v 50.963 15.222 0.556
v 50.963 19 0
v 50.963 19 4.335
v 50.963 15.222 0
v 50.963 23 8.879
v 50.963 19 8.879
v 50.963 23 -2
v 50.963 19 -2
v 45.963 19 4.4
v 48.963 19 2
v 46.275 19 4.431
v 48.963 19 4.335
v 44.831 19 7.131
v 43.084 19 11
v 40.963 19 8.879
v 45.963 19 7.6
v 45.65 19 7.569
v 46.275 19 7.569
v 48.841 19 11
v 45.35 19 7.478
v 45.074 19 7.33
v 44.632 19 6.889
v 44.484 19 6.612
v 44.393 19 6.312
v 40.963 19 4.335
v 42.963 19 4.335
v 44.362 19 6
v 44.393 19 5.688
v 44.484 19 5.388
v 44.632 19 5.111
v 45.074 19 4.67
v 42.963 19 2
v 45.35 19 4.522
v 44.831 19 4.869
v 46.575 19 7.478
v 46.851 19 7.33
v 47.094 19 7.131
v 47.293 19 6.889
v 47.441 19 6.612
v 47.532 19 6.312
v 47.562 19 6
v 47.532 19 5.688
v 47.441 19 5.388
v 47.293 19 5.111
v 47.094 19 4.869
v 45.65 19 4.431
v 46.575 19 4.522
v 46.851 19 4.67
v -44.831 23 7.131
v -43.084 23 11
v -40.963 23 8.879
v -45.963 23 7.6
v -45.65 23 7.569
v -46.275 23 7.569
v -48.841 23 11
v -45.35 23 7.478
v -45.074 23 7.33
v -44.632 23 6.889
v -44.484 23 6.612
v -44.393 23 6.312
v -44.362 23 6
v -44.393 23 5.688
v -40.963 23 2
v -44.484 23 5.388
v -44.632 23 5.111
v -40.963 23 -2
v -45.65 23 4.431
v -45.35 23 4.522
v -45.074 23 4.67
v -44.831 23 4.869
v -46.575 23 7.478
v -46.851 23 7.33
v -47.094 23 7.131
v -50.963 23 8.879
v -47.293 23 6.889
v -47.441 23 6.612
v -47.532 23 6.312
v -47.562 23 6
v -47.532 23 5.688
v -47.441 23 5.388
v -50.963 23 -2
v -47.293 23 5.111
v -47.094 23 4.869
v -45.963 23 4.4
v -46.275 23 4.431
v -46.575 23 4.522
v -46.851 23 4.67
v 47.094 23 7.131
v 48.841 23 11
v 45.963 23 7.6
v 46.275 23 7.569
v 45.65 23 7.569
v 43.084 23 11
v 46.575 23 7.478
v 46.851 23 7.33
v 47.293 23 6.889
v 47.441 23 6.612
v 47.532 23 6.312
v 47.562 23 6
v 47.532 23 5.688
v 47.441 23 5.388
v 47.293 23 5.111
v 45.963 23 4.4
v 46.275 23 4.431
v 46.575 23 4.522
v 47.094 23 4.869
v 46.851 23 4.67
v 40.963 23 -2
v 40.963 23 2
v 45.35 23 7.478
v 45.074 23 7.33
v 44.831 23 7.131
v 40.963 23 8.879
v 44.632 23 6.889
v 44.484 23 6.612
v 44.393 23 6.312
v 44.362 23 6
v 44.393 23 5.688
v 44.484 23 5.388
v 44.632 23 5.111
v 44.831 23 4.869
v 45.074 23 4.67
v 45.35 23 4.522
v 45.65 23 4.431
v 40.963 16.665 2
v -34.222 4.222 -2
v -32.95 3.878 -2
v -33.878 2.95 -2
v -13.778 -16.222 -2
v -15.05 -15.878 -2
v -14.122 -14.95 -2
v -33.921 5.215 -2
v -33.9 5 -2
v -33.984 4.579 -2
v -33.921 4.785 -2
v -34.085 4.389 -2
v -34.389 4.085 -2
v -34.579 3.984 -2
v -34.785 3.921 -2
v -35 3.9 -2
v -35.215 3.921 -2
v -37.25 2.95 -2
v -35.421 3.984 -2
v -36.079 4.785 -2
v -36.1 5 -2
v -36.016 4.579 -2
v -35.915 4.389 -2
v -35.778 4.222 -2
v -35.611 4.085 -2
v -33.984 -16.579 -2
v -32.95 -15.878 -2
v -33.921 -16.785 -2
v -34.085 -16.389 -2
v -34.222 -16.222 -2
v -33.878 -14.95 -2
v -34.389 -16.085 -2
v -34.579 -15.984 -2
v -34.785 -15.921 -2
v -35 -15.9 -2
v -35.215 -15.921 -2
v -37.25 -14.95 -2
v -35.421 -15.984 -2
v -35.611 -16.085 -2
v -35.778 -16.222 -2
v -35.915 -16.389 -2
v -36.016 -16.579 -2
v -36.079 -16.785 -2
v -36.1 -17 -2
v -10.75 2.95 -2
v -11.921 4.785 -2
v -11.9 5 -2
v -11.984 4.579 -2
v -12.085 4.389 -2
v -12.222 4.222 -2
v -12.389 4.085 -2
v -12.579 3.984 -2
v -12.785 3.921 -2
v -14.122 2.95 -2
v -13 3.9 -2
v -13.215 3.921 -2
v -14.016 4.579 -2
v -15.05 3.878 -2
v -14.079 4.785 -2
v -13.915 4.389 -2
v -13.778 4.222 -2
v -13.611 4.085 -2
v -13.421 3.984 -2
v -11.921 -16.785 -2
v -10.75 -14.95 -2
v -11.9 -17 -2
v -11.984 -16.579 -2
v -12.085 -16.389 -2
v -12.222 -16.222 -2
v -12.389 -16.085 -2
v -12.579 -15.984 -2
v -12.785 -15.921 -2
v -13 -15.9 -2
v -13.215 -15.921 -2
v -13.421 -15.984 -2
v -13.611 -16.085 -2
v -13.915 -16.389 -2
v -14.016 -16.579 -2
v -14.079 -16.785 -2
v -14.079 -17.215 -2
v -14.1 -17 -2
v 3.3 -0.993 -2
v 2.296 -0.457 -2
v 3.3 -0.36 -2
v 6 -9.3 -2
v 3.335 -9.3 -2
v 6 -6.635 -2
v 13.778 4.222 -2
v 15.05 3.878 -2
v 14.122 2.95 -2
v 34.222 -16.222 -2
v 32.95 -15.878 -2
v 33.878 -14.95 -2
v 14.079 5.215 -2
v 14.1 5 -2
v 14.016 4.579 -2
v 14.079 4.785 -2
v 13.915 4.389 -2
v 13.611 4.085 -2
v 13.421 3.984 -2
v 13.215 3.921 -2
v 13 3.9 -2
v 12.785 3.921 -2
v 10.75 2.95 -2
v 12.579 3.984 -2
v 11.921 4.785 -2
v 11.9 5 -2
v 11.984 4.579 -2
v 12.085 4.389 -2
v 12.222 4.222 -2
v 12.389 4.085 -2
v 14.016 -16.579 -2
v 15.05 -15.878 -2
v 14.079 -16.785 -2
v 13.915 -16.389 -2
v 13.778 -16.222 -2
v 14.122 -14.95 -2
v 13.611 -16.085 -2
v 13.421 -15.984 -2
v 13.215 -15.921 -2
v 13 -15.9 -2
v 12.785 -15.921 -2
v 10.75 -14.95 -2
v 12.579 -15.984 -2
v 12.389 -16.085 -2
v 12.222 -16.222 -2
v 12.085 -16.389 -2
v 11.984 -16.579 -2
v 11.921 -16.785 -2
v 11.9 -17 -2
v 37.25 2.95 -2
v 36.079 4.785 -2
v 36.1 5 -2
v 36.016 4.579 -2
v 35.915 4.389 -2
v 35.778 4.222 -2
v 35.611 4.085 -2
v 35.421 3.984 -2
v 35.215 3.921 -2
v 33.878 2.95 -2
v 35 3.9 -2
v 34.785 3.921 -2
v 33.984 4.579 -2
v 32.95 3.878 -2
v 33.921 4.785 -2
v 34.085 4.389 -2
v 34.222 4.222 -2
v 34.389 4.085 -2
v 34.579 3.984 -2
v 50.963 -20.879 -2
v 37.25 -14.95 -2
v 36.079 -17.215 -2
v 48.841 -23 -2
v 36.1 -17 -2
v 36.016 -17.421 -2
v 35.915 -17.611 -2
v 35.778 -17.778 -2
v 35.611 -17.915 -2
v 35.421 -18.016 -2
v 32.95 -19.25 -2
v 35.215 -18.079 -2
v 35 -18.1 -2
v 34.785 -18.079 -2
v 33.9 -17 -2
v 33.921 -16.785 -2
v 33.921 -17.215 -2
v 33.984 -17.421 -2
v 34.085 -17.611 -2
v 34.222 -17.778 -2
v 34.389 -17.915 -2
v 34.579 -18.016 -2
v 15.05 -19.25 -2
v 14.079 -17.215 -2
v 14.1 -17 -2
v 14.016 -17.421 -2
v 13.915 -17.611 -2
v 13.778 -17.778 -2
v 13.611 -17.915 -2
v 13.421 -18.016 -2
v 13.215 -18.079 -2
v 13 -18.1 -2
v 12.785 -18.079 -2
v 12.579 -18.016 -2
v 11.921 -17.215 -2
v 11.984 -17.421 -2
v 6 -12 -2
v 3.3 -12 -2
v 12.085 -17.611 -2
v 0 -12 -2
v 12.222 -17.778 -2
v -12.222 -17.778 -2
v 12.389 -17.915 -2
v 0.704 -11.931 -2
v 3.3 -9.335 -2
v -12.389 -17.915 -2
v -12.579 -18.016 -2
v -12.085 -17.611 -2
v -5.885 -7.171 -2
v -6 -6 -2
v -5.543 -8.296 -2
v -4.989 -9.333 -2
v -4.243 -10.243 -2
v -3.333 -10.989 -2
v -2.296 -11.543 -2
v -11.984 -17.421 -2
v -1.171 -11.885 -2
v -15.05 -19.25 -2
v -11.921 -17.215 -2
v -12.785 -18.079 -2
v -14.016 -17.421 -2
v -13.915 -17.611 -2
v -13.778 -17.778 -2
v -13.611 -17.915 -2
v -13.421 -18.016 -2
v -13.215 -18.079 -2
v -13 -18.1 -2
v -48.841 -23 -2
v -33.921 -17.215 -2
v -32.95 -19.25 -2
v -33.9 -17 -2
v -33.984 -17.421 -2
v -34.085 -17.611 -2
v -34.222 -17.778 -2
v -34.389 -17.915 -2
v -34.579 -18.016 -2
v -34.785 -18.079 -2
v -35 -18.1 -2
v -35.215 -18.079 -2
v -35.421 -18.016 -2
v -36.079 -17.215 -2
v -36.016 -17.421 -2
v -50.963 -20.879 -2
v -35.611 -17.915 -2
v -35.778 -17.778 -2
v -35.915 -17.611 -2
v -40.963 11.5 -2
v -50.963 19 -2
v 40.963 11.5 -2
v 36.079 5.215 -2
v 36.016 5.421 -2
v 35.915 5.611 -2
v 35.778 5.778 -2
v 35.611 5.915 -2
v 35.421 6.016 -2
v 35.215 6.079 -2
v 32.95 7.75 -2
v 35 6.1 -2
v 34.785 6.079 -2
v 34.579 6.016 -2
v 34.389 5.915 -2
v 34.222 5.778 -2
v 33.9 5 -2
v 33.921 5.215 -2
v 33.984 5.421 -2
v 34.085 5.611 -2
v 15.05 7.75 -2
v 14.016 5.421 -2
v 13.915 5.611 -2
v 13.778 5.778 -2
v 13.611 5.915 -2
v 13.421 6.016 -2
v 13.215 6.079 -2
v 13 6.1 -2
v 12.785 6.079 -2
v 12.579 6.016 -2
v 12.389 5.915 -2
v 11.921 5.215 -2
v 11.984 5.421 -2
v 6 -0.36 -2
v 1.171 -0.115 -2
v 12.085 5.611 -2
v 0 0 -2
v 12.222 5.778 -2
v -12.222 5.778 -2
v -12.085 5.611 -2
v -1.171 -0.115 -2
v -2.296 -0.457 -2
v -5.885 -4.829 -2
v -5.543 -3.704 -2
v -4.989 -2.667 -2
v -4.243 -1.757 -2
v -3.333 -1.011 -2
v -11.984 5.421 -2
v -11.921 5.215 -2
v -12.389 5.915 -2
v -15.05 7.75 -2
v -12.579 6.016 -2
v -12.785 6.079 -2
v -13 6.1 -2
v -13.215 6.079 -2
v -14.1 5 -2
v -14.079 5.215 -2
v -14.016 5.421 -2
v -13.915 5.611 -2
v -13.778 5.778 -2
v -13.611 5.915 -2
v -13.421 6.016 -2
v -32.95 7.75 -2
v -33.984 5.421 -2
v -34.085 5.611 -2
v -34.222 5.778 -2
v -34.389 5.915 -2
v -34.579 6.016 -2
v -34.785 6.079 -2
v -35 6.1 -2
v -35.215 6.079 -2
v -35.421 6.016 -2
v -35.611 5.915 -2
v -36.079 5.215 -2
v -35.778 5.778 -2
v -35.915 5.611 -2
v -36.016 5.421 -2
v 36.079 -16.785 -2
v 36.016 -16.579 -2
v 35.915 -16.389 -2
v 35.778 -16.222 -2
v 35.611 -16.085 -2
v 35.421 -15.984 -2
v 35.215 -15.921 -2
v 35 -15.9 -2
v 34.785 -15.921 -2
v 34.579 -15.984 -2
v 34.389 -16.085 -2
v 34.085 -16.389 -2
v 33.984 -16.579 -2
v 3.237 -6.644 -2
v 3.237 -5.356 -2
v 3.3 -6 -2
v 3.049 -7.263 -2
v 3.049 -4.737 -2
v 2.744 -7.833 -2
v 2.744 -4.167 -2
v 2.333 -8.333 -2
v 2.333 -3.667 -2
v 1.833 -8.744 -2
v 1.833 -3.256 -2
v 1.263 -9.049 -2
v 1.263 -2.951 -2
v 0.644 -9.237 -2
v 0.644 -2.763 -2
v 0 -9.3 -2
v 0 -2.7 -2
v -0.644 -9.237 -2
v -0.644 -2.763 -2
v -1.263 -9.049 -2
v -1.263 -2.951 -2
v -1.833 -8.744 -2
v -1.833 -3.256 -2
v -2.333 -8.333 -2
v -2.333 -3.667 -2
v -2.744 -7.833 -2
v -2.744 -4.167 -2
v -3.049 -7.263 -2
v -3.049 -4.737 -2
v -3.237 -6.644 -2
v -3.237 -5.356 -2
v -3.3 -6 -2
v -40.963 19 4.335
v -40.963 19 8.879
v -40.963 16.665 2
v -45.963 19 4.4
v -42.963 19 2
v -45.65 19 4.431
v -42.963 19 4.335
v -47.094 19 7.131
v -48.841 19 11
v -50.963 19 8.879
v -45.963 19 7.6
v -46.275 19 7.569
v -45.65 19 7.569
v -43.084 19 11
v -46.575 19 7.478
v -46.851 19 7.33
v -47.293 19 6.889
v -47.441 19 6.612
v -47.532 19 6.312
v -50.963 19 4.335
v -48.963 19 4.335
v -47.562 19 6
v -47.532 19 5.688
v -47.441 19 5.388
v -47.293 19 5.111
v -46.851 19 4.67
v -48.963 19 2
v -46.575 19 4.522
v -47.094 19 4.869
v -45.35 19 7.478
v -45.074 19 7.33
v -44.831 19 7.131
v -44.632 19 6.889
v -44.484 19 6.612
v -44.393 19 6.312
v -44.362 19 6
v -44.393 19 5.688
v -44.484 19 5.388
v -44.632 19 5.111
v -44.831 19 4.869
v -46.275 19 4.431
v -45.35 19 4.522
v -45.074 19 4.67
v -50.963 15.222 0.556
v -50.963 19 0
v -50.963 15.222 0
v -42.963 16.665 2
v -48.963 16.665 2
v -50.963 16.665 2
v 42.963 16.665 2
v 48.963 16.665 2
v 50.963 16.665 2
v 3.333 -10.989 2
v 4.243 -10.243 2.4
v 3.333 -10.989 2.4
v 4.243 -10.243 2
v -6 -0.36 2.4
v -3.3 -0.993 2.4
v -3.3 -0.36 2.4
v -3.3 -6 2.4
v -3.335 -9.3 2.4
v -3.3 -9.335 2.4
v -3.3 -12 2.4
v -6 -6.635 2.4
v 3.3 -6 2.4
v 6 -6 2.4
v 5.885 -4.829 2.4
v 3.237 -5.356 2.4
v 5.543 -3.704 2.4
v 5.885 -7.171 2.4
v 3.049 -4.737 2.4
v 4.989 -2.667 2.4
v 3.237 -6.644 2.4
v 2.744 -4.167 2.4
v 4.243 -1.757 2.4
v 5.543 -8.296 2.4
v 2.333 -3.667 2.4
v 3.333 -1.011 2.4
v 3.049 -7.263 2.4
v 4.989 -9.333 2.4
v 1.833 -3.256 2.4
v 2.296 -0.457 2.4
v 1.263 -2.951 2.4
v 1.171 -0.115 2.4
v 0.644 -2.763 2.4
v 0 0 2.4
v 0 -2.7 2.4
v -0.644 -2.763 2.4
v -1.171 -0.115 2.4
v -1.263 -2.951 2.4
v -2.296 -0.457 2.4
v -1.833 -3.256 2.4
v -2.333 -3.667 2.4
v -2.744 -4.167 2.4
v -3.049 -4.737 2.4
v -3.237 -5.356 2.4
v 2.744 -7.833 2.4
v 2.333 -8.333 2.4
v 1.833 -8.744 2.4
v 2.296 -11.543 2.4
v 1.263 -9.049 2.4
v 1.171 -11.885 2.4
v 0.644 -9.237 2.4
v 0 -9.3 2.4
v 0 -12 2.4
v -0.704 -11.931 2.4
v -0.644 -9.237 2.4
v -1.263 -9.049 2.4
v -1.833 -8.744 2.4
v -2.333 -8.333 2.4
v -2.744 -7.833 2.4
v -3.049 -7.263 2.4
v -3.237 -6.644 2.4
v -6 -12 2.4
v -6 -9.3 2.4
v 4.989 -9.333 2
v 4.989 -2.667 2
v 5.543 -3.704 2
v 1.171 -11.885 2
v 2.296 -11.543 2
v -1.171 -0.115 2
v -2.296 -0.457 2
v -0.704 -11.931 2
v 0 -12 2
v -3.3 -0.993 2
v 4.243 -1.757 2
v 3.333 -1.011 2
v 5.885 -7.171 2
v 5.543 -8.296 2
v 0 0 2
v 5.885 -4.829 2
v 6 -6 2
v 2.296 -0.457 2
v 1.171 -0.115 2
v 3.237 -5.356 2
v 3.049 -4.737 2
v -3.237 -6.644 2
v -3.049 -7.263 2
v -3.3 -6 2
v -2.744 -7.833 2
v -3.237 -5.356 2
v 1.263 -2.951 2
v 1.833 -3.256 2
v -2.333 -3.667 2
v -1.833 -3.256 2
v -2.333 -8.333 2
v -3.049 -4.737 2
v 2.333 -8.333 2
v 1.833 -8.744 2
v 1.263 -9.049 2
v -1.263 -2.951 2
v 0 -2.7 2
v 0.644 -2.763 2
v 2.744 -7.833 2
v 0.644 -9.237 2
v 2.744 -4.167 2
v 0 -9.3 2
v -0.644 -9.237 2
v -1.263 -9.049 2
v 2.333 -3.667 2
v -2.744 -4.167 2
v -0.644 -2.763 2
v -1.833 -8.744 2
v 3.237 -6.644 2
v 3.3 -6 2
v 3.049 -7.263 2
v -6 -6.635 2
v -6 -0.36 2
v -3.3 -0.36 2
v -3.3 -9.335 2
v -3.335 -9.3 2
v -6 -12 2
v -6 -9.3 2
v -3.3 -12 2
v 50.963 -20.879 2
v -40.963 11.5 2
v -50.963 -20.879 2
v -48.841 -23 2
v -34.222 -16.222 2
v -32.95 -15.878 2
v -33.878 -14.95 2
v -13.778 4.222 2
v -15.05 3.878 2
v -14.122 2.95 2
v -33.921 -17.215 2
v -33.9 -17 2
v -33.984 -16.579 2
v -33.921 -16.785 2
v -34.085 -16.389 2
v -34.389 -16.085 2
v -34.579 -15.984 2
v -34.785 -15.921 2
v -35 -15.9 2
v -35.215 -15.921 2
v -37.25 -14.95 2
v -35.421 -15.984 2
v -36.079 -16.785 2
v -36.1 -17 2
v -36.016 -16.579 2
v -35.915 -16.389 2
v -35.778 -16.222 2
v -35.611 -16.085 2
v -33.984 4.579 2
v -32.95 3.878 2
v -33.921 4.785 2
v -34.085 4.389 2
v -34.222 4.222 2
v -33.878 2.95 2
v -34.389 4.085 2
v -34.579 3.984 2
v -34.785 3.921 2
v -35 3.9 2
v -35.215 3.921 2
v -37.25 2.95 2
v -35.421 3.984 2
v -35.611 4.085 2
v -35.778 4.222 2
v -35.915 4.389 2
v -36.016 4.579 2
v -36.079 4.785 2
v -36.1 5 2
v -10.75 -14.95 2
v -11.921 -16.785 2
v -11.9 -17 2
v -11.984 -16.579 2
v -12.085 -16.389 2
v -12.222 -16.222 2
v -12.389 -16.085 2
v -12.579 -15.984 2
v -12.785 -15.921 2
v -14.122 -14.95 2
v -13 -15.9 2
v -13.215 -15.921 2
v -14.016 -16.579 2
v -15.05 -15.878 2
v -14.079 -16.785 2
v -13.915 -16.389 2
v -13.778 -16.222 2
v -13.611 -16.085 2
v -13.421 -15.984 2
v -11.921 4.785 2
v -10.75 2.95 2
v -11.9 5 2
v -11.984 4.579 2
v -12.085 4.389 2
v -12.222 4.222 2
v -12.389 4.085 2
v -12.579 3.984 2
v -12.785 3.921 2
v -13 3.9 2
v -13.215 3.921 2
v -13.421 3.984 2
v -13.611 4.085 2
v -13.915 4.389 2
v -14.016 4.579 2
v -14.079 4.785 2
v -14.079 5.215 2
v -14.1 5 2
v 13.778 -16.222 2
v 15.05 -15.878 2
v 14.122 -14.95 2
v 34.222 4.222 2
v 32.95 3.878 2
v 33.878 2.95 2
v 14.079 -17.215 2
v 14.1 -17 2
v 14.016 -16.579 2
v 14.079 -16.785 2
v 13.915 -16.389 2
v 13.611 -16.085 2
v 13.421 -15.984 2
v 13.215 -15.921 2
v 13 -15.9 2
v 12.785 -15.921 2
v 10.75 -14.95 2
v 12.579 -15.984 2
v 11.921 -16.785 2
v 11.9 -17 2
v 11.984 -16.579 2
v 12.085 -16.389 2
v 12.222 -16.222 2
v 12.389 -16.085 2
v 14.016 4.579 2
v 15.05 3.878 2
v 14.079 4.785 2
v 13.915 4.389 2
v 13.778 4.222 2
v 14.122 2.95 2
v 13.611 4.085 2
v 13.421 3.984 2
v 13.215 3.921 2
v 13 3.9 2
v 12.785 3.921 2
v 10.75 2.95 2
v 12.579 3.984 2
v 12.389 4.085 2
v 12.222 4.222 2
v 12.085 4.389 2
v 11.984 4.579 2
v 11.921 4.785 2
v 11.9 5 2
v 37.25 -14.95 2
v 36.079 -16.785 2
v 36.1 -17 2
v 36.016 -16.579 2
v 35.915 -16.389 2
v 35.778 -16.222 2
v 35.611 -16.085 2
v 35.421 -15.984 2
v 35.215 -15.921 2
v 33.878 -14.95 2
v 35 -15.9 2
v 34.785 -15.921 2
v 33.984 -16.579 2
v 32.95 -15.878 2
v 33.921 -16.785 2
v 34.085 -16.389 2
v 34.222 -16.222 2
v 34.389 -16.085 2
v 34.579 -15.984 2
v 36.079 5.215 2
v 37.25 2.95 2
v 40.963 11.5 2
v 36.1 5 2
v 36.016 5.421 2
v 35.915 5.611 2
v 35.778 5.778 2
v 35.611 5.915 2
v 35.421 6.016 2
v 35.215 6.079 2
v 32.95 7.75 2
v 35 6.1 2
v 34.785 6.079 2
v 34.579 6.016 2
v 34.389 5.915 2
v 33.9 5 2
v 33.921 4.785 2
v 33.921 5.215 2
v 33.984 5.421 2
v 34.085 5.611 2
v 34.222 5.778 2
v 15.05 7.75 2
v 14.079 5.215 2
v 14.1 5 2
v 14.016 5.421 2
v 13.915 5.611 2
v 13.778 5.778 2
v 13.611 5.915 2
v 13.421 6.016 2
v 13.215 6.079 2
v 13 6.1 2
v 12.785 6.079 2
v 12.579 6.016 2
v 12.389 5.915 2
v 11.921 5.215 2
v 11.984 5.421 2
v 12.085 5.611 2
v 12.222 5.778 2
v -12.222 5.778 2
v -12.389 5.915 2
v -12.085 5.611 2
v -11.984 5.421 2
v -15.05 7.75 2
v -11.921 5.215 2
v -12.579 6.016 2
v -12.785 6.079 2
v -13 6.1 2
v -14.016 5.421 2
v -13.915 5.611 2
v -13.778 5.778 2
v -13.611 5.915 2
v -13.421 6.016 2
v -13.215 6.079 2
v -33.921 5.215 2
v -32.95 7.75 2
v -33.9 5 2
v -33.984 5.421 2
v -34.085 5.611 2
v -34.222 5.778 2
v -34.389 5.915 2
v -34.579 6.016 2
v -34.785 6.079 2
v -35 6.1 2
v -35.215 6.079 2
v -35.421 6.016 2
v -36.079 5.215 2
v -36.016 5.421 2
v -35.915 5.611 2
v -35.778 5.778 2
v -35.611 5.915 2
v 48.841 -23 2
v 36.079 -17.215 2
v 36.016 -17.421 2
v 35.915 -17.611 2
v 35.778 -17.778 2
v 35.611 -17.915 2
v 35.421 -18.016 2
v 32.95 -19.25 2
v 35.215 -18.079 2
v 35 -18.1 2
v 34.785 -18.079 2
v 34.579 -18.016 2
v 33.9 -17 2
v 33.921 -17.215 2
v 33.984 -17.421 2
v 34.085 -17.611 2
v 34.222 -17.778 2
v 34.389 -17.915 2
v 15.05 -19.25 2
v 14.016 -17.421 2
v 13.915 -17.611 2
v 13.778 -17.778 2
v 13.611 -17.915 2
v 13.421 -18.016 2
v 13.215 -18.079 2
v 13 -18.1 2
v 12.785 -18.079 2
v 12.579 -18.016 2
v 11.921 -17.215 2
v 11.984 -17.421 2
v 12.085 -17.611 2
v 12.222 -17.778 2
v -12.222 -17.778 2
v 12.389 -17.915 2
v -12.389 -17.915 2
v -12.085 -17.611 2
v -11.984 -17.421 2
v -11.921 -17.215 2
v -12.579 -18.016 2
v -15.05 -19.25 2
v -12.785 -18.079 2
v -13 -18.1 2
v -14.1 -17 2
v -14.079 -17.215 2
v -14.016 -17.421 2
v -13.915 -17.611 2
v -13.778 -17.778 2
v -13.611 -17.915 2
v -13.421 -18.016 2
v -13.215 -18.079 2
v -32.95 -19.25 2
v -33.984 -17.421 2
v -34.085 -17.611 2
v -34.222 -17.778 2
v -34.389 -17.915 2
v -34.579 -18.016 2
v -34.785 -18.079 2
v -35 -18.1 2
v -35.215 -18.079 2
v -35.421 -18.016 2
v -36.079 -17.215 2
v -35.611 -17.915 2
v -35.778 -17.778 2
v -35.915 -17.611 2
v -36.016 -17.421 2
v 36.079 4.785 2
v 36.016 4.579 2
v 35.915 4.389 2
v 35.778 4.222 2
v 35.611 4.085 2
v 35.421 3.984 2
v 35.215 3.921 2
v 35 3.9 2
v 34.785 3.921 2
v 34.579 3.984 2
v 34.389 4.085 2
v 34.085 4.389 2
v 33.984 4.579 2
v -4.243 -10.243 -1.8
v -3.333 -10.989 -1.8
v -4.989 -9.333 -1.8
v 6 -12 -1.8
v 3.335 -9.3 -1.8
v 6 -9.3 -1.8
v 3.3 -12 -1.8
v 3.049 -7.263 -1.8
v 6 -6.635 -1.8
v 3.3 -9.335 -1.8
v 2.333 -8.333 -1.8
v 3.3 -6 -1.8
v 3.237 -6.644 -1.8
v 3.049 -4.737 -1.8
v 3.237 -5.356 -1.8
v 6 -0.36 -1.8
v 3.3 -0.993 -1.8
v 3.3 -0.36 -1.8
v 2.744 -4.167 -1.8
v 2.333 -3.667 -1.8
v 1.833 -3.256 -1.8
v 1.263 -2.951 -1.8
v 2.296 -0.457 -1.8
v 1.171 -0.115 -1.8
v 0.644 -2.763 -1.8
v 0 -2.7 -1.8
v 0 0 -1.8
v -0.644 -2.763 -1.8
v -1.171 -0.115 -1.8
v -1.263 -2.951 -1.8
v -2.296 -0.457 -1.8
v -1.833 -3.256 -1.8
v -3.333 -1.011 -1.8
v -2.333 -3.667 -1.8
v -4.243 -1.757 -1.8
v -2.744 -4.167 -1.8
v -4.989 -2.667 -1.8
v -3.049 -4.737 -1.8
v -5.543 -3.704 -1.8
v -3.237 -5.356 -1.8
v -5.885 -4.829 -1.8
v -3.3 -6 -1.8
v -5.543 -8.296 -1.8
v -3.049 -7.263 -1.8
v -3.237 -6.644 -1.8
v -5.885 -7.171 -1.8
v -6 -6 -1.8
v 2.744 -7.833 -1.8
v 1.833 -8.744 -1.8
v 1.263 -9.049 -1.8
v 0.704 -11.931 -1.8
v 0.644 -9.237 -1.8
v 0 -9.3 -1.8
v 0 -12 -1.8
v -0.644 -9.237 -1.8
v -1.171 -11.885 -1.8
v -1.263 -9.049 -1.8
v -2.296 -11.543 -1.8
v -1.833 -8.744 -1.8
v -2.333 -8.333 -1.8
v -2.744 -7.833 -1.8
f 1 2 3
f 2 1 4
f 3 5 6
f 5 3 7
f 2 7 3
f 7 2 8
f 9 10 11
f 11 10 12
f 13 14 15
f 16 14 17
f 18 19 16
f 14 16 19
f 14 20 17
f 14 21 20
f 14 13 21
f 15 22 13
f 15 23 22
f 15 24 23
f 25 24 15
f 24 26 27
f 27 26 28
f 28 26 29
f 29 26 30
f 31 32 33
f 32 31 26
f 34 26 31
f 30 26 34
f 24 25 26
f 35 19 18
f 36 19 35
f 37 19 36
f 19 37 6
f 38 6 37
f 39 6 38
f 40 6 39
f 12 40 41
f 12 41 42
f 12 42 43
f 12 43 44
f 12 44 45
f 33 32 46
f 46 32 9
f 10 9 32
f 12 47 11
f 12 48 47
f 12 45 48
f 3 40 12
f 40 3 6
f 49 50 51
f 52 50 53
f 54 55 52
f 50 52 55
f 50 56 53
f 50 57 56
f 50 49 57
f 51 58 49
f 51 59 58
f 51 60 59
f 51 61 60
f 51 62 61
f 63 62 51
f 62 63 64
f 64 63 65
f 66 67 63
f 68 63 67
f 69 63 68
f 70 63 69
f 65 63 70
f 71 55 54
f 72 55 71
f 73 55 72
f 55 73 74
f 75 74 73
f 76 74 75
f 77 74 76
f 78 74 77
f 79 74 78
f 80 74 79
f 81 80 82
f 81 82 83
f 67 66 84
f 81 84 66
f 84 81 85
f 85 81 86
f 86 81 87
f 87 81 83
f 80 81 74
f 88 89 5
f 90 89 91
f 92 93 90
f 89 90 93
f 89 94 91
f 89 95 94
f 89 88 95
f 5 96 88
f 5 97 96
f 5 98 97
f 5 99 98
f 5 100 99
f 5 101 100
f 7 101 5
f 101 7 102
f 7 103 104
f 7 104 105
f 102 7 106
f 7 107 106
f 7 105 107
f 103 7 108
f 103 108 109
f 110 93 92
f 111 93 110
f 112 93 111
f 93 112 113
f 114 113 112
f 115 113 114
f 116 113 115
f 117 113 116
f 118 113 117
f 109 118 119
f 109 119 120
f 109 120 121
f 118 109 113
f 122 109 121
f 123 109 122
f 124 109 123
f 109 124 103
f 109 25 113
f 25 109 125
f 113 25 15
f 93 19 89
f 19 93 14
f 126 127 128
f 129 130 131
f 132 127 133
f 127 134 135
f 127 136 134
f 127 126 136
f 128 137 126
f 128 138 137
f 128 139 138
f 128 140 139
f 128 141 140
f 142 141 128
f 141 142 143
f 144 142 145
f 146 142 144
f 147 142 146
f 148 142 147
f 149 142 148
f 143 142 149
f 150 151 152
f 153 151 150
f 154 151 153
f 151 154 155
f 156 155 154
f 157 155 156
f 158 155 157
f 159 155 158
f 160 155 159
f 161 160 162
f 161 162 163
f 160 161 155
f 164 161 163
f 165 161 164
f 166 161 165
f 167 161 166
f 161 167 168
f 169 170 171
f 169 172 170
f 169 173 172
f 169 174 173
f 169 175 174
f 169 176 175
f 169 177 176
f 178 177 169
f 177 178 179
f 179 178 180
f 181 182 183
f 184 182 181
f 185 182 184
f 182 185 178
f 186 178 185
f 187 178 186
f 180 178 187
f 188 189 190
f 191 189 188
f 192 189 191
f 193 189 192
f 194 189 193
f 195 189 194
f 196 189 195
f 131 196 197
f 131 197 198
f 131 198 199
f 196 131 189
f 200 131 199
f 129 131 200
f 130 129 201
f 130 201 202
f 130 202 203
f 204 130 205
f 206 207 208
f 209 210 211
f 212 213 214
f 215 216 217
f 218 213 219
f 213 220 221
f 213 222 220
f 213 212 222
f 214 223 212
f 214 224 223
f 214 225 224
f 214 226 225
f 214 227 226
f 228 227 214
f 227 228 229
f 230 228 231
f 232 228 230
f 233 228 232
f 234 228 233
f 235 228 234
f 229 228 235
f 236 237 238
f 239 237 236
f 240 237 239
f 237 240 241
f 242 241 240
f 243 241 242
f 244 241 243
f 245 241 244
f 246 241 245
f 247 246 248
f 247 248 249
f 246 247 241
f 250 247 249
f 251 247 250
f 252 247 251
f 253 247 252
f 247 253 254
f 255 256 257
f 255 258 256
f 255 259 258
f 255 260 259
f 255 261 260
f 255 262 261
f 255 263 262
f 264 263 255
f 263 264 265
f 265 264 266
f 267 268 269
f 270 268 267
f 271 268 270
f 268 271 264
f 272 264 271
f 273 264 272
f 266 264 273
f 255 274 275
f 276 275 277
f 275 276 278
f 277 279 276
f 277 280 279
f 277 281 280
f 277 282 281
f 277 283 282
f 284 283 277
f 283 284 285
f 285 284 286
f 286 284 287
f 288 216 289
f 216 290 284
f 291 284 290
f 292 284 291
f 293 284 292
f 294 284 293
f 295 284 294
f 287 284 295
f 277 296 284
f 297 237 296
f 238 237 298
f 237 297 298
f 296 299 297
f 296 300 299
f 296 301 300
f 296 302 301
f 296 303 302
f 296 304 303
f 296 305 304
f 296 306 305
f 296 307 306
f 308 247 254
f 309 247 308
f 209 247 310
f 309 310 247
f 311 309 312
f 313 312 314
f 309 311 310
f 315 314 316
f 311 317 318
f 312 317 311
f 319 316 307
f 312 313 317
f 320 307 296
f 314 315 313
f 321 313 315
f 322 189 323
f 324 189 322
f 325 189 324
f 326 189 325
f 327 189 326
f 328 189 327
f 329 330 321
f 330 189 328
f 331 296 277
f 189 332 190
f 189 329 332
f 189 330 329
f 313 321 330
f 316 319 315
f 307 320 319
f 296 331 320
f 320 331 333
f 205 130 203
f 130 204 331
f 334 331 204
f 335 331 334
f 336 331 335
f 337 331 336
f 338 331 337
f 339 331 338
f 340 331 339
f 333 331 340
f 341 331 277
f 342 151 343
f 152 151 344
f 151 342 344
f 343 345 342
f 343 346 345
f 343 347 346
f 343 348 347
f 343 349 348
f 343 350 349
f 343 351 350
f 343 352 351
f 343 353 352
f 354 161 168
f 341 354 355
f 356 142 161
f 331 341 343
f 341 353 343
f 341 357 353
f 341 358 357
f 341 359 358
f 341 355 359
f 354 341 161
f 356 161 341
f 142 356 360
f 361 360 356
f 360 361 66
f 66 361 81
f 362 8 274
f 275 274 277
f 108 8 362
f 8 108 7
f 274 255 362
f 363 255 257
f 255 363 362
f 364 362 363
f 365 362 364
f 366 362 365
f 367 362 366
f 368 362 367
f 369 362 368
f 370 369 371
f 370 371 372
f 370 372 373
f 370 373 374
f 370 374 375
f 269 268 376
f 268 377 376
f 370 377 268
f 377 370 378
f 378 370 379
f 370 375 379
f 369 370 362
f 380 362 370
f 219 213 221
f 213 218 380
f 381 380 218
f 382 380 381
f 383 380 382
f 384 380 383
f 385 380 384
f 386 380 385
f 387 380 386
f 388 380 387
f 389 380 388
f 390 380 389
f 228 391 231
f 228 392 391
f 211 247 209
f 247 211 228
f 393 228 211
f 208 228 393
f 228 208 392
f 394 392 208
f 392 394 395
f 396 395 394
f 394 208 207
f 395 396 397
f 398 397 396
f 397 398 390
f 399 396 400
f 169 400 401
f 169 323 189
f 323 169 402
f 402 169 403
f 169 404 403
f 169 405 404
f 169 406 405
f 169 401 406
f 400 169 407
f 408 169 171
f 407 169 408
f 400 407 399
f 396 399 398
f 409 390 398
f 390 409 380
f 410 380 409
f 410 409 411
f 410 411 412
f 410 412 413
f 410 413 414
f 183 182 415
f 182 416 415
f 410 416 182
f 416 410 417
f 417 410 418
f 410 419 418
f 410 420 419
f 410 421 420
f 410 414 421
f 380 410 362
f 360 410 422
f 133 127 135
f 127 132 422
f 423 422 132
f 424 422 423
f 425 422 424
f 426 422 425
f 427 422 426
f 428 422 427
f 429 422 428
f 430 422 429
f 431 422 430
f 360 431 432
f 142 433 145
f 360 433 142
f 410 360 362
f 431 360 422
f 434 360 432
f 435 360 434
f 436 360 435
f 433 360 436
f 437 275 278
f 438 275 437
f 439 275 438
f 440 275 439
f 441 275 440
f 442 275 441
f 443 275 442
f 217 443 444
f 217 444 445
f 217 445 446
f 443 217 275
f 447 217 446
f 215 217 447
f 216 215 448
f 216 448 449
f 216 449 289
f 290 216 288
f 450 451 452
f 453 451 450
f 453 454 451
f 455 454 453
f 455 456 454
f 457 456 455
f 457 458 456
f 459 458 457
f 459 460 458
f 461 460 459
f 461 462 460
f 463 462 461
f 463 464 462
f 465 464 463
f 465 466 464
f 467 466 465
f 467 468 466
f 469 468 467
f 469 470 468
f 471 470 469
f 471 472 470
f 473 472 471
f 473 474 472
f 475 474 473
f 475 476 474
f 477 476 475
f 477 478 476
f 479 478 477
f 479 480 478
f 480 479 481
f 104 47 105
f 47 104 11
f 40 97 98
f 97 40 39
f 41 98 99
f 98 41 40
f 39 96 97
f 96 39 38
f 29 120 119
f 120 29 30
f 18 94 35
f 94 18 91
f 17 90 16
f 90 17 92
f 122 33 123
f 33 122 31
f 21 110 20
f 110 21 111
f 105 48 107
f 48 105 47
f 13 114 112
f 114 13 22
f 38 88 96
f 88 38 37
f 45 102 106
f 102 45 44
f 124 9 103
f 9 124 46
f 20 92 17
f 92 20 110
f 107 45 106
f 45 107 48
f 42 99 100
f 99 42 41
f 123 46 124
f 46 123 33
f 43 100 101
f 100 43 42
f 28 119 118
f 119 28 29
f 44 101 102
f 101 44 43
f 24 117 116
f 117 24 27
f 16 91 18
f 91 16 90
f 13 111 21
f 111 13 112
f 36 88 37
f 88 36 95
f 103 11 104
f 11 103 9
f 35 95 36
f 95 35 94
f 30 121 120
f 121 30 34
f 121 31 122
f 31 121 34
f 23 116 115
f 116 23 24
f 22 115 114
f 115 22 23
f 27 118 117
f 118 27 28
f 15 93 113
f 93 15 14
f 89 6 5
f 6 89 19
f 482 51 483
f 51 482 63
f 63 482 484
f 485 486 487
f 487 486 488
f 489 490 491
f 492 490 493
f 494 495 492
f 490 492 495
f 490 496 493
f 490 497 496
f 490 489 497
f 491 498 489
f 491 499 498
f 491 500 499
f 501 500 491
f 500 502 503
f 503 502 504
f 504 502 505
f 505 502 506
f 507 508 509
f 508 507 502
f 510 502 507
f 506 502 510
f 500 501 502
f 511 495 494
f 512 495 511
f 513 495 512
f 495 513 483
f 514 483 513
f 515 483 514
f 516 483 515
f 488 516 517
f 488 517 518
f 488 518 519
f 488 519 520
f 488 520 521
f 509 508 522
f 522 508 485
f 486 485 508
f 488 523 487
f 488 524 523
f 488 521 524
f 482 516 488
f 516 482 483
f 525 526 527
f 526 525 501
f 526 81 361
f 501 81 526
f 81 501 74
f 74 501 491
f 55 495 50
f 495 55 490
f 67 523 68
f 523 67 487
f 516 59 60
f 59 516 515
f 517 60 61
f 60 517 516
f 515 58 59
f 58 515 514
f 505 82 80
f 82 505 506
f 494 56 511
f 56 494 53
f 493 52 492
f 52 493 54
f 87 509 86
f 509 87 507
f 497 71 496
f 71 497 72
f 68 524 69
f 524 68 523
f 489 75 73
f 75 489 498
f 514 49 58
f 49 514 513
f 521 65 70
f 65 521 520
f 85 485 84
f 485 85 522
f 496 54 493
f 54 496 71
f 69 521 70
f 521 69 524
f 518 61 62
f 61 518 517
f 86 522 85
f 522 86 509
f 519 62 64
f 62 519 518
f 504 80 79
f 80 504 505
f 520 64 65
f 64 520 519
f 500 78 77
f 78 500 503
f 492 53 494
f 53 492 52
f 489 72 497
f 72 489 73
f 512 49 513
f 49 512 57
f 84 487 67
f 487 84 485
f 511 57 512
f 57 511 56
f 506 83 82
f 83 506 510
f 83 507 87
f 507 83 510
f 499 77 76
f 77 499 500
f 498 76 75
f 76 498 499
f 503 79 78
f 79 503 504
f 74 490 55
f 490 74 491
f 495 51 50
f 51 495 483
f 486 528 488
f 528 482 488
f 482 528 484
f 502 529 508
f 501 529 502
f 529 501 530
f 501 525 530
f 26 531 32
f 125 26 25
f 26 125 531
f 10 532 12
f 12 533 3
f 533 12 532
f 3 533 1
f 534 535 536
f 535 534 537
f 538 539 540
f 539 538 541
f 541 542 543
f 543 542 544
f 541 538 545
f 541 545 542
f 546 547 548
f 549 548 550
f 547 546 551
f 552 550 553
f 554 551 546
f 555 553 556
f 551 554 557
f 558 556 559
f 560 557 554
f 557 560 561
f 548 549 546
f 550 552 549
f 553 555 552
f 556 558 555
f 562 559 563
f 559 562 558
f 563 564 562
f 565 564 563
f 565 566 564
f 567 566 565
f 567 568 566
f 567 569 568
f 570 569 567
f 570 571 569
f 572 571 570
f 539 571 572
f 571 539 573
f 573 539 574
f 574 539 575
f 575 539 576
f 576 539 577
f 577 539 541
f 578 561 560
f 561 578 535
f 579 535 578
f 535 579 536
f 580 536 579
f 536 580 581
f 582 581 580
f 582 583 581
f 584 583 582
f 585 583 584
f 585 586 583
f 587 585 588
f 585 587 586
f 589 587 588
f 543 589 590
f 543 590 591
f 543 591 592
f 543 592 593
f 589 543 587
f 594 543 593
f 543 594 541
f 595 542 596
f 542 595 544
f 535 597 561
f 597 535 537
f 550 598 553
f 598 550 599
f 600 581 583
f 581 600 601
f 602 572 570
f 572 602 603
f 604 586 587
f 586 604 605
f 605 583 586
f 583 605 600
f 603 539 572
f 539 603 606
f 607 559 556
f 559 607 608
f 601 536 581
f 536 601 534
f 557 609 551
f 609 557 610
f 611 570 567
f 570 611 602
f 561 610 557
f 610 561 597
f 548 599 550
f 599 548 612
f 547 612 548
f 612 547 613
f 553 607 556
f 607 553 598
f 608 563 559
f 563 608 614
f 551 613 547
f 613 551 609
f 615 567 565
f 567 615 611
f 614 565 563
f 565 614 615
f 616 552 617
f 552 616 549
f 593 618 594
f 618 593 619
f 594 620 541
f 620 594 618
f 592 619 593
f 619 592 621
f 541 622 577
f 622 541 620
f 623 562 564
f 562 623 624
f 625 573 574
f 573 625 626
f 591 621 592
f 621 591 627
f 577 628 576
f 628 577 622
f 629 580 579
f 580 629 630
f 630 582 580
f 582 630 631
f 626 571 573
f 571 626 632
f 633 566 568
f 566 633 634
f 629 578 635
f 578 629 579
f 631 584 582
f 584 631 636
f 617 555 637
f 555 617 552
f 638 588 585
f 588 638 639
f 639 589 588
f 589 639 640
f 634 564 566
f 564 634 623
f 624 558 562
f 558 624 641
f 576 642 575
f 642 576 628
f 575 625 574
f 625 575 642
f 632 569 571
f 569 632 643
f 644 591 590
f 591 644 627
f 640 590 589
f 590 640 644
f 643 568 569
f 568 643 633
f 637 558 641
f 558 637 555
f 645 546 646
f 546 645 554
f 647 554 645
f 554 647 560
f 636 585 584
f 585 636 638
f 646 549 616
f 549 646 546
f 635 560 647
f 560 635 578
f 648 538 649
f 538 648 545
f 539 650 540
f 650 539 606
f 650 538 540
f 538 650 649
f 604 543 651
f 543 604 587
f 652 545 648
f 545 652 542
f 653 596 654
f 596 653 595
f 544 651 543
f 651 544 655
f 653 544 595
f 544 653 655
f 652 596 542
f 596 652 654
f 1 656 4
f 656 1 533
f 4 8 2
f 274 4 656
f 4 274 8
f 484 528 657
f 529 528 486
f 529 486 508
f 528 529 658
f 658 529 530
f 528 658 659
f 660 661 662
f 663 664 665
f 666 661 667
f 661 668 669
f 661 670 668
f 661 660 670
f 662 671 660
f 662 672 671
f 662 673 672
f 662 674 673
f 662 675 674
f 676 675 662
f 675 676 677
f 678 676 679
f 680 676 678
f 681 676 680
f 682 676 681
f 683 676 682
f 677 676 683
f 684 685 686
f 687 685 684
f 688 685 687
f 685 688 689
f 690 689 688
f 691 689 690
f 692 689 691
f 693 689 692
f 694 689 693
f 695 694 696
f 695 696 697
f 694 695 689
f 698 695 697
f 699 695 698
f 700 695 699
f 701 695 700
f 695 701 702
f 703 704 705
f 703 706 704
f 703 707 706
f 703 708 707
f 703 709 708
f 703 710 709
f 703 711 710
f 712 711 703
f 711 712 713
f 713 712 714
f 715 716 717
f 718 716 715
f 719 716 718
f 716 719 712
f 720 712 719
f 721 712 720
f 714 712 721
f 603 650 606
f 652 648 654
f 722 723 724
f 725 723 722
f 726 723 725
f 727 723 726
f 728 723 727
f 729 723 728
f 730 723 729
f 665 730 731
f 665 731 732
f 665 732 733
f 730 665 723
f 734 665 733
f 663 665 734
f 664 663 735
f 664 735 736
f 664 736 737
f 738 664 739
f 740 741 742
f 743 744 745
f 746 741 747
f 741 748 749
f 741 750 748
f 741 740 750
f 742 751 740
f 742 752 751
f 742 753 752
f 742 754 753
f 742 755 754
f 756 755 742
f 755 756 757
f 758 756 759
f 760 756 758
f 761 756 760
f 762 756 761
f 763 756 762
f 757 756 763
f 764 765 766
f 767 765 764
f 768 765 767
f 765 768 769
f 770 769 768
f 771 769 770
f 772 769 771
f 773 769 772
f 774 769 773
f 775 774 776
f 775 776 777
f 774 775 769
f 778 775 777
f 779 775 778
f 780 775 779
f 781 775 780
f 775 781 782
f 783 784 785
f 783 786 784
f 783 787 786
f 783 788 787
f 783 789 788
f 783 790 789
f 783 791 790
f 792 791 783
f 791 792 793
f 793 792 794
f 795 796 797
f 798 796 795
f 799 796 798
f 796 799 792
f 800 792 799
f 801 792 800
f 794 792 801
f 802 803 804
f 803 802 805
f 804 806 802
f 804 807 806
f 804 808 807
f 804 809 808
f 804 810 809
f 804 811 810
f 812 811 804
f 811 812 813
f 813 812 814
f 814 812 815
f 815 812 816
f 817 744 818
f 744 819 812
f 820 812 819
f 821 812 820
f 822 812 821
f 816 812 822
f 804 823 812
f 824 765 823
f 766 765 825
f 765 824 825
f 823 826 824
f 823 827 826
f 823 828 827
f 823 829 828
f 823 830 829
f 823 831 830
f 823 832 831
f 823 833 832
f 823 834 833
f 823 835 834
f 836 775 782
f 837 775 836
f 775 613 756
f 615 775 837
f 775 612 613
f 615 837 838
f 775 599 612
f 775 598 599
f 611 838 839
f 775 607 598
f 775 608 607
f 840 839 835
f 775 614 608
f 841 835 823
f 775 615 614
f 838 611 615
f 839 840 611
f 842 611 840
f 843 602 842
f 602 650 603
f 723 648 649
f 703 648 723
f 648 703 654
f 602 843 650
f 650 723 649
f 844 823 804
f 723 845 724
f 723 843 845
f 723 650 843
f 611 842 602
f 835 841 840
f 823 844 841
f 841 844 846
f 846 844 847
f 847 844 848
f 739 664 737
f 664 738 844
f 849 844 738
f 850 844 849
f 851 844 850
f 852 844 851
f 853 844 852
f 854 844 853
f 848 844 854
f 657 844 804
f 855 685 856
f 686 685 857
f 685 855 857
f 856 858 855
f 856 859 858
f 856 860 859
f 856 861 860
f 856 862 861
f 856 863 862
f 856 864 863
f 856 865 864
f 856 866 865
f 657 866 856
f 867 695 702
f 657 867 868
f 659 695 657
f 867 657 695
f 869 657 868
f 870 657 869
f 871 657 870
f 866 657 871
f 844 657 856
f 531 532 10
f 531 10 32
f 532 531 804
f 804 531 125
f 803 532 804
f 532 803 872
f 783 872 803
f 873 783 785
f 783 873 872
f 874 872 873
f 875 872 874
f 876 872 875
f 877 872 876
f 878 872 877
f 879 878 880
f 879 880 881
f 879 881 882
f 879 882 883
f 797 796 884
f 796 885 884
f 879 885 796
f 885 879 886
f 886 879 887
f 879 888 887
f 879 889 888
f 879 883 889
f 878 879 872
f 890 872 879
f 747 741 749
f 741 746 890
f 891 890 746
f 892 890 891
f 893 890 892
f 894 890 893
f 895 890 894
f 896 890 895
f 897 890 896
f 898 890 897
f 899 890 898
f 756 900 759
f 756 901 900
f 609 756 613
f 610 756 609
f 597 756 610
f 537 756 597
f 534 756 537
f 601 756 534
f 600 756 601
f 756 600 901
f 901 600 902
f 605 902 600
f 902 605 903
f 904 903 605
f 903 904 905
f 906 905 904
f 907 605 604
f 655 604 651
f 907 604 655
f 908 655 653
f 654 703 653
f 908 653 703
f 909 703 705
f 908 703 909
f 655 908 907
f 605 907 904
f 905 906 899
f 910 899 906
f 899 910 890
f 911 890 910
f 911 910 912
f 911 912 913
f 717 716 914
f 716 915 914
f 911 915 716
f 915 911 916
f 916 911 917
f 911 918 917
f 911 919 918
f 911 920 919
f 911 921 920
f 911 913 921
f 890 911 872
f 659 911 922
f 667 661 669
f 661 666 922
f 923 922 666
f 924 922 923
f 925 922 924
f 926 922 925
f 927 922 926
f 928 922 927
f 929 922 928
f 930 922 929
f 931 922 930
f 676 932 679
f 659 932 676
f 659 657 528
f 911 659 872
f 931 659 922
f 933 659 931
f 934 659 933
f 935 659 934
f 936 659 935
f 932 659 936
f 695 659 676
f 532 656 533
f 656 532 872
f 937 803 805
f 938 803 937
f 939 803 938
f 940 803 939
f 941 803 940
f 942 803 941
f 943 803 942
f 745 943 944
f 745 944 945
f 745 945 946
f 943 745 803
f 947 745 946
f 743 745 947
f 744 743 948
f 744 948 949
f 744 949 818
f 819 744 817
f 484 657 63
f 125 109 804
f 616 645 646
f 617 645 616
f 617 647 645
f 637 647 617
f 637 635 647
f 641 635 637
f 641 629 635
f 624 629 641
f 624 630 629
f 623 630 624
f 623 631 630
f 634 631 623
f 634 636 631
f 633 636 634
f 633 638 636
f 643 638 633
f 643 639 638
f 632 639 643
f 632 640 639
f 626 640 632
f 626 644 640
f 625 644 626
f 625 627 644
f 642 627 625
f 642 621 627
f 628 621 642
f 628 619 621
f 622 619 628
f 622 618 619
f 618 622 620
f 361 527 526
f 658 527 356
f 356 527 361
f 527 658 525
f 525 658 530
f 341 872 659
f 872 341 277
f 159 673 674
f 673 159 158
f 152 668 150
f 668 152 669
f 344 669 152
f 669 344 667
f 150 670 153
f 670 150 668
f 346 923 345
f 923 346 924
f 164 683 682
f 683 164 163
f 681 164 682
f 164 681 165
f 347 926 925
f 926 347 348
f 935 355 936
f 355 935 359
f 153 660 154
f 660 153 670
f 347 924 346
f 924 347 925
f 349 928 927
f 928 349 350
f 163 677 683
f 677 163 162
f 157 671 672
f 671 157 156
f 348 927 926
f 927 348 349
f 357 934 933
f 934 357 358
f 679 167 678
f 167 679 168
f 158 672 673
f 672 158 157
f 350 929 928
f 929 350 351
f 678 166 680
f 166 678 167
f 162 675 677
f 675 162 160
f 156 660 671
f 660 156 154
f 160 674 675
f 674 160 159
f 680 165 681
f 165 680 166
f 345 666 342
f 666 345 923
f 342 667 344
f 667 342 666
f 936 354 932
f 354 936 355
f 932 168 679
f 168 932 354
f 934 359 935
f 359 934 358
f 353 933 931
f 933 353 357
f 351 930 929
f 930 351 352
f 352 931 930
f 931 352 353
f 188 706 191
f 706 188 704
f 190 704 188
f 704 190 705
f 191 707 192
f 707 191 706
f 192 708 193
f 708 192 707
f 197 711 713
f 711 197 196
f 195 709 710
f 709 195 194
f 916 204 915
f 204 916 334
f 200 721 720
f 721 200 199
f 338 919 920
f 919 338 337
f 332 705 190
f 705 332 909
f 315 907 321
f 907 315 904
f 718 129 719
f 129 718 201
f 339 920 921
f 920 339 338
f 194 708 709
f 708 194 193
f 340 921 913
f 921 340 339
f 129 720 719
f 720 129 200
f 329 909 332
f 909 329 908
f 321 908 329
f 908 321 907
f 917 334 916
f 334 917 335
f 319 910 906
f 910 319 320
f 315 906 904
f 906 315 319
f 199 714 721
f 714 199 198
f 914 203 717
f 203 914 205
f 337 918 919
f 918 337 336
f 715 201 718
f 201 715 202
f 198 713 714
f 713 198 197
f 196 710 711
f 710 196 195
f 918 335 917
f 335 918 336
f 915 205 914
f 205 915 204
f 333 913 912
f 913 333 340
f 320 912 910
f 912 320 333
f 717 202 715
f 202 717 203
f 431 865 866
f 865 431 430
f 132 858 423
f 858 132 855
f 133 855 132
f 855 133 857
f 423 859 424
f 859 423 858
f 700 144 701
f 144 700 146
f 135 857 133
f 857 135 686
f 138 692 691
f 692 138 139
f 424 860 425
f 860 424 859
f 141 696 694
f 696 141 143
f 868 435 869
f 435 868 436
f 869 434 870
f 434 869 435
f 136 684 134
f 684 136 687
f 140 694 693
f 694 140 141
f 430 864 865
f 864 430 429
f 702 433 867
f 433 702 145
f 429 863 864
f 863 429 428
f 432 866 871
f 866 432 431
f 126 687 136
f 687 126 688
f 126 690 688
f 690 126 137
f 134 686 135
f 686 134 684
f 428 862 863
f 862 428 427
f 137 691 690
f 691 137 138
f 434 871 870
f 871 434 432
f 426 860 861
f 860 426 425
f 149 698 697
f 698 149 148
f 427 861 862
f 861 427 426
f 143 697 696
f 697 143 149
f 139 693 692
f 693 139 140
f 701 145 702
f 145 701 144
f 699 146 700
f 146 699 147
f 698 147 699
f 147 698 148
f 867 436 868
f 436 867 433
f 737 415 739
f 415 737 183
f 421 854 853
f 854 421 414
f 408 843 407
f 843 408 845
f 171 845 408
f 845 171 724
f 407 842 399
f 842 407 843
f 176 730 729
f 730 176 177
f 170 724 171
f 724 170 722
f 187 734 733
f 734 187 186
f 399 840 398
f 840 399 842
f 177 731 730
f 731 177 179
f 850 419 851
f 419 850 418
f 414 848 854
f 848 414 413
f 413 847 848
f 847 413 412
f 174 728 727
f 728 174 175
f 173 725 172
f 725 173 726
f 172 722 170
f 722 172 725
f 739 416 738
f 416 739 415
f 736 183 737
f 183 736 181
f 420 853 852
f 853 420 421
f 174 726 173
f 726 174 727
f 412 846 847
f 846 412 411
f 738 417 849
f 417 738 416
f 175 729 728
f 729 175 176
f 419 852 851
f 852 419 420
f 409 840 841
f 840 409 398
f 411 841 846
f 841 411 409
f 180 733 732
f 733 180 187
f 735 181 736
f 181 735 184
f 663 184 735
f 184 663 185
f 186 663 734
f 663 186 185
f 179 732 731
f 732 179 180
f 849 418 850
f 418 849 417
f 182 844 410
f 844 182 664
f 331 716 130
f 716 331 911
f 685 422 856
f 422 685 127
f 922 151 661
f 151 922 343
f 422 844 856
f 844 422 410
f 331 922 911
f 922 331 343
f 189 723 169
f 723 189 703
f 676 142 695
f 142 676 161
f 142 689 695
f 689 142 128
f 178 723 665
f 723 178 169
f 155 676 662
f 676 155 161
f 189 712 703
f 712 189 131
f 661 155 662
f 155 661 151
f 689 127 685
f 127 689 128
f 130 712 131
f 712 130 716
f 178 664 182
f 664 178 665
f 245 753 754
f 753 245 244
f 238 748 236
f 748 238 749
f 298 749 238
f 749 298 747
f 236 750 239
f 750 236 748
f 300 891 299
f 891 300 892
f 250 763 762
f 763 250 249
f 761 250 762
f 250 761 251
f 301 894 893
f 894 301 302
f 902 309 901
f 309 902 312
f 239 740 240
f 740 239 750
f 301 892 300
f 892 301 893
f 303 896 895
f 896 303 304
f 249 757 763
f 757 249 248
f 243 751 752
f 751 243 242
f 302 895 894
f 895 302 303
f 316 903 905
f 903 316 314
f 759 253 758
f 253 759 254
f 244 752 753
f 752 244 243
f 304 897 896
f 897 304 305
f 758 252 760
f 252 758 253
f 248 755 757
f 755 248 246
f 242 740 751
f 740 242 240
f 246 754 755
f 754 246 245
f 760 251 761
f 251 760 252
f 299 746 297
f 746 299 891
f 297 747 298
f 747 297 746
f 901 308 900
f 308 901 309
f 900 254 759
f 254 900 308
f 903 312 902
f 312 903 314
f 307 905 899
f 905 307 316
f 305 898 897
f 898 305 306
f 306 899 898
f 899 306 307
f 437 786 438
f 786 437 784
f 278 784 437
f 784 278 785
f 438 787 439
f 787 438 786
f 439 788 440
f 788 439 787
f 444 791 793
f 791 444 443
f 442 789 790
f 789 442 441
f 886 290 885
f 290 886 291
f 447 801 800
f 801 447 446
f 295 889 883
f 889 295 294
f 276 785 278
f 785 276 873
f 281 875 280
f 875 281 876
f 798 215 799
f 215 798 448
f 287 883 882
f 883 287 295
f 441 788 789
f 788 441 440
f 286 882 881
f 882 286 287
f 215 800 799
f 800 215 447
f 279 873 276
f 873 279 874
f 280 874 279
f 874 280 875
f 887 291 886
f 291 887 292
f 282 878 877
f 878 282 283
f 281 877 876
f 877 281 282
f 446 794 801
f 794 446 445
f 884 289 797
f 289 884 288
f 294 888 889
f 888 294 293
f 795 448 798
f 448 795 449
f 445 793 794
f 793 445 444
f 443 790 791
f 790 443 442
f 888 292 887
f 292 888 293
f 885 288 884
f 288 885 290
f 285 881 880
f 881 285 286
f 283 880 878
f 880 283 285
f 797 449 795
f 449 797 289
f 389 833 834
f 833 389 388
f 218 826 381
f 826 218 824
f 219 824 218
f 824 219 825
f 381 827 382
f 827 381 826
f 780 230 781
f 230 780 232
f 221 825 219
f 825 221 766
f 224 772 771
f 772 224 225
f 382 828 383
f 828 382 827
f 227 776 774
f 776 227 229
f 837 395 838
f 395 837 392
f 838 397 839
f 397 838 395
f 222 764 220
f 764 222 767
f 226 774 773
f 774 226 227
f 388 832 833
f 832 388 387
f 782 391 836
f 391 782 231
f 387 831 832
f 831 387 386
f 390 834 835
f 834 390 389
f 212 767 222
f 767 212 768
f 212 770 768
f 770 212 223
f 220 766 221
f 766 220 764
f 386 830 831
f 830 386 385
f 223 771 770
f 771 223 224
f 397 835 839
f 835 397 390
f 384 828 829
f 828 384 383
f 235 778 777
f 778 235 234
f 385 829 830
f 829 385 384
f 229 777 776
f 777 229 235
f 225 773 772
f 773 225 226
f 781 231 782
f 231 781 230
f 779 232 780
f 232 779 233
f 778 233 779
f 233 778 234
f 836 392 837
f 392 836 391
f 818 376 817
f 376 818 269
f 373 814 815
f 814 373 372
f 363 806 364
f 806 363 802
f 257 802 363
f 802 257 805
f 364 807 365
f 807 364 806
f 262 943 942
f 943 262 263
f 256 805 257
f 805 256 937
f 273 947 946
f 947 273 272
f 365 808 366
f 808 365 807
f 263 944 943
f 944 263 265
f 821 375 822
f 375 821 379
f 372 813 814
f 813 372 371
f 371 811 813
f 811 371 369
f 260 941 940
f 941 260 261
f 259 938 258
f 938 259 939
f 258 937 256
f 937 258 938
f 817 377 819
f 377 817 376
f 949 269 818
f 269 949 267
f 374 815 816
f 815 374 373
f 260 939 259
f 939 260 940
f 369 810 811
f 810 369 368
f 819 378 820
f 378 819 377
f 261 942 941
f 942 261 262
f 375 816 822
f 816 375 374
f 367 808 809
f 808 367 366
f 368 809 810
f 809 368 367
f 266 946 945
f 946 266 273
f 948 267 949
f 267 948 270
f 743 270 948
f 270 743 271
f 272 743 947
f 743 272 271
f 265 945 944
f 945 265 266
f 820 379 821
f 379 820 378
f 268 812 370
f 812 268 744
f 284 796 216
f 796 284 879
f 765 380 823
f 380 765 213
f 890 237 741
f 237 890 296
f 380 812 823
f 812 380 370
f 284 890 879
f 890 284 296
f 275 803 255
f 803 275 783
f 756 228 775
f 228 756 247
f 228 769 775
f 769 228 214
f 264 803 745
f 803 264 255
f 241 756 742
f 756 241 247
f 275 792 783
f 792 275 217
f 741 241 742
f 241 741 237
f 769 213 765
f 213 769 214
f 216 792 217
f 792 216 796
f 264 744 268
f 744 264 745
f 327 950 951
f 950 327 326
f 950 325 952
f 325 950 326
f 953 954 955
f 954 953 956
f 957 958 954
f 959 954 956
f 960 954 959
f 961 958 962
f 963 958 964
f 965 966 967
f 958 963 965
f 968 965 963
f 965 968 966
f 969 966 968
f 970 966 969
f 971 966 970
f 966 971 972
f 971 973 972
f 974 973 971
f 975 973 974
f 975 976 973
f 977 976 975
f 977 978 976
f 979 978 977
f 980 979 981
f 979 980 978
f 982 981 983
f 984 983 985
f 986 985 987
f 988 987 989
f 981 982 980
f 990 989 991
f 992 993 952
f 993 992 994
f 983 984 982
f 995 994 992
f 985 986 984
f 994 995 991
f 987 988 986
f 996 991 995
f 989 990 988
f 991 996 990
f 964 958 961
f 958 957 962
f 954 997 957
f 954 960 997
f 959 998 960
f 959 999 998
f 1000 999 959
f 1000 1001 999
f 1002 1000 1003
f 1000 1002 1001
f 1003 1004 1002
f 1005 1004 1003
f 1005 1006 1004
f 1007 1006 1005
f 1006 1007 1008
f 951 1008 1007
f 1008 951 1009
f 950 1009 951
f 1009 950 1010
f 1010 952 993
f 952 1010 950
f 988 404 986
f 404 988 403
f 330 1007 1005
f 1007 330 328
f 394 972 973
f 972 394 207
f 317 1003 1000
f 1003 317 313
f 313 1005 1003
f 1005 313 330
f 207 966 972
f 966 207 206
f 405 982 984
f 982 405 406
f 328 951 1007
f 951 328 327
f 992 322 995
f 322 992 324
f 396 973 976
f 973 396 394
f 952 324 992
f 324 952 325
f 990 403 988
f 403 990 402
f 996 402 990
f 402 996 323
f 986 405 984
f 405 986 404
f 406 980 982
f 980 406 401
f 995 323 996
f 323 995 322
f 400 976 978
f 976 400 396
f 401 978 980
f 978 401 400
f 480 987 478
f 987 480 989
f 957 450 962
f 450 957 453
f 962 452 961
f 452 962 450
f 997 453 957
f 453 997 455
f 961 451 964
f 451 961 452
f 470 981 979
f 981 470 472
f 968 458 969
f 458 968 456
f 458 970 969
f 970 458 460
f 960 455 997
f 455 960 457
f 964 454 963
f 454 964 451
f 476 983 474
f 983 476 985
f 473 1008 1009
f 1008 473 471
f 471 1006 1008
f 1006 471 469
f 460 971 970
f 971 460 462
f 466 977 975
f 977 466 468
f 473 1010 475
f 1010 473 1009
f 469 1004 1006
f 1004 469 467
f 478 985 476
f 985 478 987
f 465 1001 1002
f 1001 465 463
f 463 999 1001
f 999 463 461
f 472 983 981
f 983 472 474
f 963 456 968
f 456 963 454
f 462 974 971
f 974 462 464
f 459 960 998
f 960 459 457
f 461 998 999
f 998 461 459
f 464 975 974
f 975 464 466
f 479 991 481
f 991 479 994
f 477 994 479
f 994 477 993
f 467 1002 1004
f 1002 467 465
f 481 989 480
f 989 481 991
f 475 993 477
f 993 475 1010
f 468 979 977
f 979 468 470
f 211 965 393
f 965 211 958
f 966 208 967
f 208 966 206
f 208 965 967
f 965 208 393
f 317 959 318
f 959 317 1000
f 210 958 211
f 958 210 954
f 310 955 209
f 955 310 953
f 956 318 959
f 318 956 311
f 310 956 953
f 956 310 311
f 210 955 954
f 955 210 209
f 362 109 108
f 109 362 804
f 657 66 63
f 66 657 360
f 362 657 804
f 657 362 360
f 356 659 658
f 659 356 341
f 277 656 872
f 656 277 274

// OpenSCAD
// Bracket for mounting Framos GMSL deserializers onto Agilex 5 MDK carrier board

hole_distance = 91.925;
mount_width = 10;
mount_height = 13;

width = hole_distance + mount_width;
height = 46;
depth = 4;

board_clearance = 11;
hole_dia = 3.2;

support_depth = depth - 2;
support_size = sqrt((board_clearance * board_clearance) / 2);

logo_diameter = 12;
logo_x_offset = 0;
logo_y_offset = 6;
logo_z_offset = depth / 2;

 
module gmsl_module_cutout(depth) {
    module_size = 26.5;
    hole_diameter = 2.20;     // Diameter of the mounting holes
    pad_diameter = 4.3;
    hole_spacing = 22;
    bottom_clearance = 0.5;

    offset = hole_spacing / 2;

    translate([-offset, -offset, 0])
        cylinder(h = depth + 4, d = hole_diameter, center = true, $fn = 32);

    translate([offset, -offset, 0])
        cylinder(h = depth + 4, d = hole_diameter, center = true, $fn = 32);

    translate([-offset, offset, 0])
        cylinder(h = depth + 4, d = hole_diameter, center = true, $fn = 32);

    translate([offset, offset, 0])
        cylinder(h = depth + 4, d = hole_diameter, center = true, $fn = 32);

    translate ([0,bottom_clearance/2,0])
        cube([module_size - 2 * pad_diameter, module_size+bottom_clearance, depth + 4], center = true);
    
    cube([module_size, module_size - 2 * pad_diameter, depth + 4], center = true);

    // Chamfers
    chamfer_size = 4;

    translate([-8,-8,0])
        rotate([0,0,45])
            cube([chamfer_size, chamfer_size, depth + 4], center = true);

    translate([-8,8,0])
        rotate([0,0,45])
            cube([chamfer_size, chamfer_size, depth + 4], center = true);

    translate([8,-8,0])
        rotate([0,0,45])
            cube([chamfer_size, chamfer_size, depth + 4], center = true);

    translate([8,8,0])
        rotate([0,0,45])
            cube([chamfer_size, chamfer_size, depth + 4], center = true);
}


module board_mount(depth) {
    difference() {
        cube([mount_width, mount_height, depth], center = true);
        translate([0, 1.5, 0])
            cylinder(h = depth + 4, d = hole_dia, center = true, $fn = 32);

        // Chamfers
        chamfer_size = 3;

        translate([-mount_width / 2, mount_height / 2, 0])
            rotate([0,0,45])
                cube([chamfer_size, chamfer_size, depth + 4], center = true);

        translate([mount_width / 2, mount_height / 2, 0])
            rotate([0,0,45])
                cube([chamfer_size, chamfer_size, depth + 4], center = true);                
    }
}


module board_mount_support(){
        difference() {
            rotate([0,0,0]){
                cube([support_size, support_size, support_depth], center = true);
            }

            translate([-support_size + 2, -support_size + 2, 0])
                rotate([0,0,45])
                    cube([2 * support_size, 2 * support_size, support_depth + 2], center = true);
        }
}

module logo(diameter, height){
    union(){
        diameter_inner = diameter * 0.55;
        width = (diameter - diameter_inner) / 2;

        difference(){
            union(){
                
                difference(){
                    cylinder(h = height, d = diameter, center = true, $fn = 32);
                    cylinder(h = height + 1, d = diameter_inner, center = true, $fn = 32);
                }

                translate([(diameter_inner + width) / 2, 0, 0])
                    cube([width, diameter * 0.94, height], center = true);
            }

            offset = (diameter * 1.26) / 2;
            translate([offset, offset, 0])
                rotate([0,0,45])
                    cube([diameter, diameter, height + 1], center = true);
        }

        translate([(diameter_inner + width) / 2, (diameter_inner + width) / 2, 0])
            cube([width, width, height], center = true);
    }
}

difference() {
    union() {
        // Main body
        cube([width, height, depth], center = true);

        // Board mount
        //translate([(width - mount_width) / 2, (height - depth) / 2, (mount_height - depth) / 2])
        translate([hole_distance / 2, (height - depth) / 2, (mount_height - depth) / 2])
            rotate([90,0,0])
                board_mount(depth);

        // Board mount
        //translate([-(width - mount_width) / 2, (height - depth) / 2, (mount_height - depth) / 2])
        translate([-hole_distance / 2, (height - depth) / 2, (mount_height - depth) / 2])
            rotate([90,0,0])
                board_mount(depth);

        // Board mount supports
        translate([-(width + support_depth)/2 + mount_width, (height - support_size)/2, support_size / 2])
            rotate([0,90,0])
                board_mount_support();

        translate([-(width - support_depth)/2, (height - support_size)/2, support_size / 2])
            rotate([0,90,0])
                board_mount_support();

        translate([(width + support_depth)/2 - mount_width, (height - support_size)/2, support_size / 2])
            rotate([0,90,0])
                board_mount_support();

        translate([(width - support_depth)/2, (height - support_size)/2, support_size / 2])
            rotate([0,90,0])
                board_mount_support();

        translate([logo_x_offset, -logo_y_offset, logo_z_offset])
            rotate([0,0,180])
                logo(logo_diameter, 0.8);                
    }

    // Cutout for the board connectors
    translate([0, (height - board_clearance) / 2, 0])
    cube([width - 2 * mount_width, board_clearance + 1, depth + 2], center = true);

    gmsl_offset_x = 24;
    gmsl_offset_y = 6;

    translate([-gmsl_offset_x, -gmsl_offset_y, 0])
        gmsl_module_cutout(depth);

    translate([gmsl_offset_x, -gmsl_offset_y ,0])
        gmsl_module_cutout(depth);

    // Chamfers
    chamfer_size = 3;

    translate([-width / 2, -height / 2, 0])
        rotate([0,0,45])
            cube([chamfer_size, chamfer_size, depth + 4], center = true);

    translate([width / 2, -height / 2, 0])
        rotate([0,0,45])
            cube([chamfer_size, chamfer_size, depth + 4], center = true);

    translate([logo_x_offset, -logo_y_offset, -logo_z_offset])
        rotate([180,0,0])
            logo(logo_diameter, 0.4);
}
